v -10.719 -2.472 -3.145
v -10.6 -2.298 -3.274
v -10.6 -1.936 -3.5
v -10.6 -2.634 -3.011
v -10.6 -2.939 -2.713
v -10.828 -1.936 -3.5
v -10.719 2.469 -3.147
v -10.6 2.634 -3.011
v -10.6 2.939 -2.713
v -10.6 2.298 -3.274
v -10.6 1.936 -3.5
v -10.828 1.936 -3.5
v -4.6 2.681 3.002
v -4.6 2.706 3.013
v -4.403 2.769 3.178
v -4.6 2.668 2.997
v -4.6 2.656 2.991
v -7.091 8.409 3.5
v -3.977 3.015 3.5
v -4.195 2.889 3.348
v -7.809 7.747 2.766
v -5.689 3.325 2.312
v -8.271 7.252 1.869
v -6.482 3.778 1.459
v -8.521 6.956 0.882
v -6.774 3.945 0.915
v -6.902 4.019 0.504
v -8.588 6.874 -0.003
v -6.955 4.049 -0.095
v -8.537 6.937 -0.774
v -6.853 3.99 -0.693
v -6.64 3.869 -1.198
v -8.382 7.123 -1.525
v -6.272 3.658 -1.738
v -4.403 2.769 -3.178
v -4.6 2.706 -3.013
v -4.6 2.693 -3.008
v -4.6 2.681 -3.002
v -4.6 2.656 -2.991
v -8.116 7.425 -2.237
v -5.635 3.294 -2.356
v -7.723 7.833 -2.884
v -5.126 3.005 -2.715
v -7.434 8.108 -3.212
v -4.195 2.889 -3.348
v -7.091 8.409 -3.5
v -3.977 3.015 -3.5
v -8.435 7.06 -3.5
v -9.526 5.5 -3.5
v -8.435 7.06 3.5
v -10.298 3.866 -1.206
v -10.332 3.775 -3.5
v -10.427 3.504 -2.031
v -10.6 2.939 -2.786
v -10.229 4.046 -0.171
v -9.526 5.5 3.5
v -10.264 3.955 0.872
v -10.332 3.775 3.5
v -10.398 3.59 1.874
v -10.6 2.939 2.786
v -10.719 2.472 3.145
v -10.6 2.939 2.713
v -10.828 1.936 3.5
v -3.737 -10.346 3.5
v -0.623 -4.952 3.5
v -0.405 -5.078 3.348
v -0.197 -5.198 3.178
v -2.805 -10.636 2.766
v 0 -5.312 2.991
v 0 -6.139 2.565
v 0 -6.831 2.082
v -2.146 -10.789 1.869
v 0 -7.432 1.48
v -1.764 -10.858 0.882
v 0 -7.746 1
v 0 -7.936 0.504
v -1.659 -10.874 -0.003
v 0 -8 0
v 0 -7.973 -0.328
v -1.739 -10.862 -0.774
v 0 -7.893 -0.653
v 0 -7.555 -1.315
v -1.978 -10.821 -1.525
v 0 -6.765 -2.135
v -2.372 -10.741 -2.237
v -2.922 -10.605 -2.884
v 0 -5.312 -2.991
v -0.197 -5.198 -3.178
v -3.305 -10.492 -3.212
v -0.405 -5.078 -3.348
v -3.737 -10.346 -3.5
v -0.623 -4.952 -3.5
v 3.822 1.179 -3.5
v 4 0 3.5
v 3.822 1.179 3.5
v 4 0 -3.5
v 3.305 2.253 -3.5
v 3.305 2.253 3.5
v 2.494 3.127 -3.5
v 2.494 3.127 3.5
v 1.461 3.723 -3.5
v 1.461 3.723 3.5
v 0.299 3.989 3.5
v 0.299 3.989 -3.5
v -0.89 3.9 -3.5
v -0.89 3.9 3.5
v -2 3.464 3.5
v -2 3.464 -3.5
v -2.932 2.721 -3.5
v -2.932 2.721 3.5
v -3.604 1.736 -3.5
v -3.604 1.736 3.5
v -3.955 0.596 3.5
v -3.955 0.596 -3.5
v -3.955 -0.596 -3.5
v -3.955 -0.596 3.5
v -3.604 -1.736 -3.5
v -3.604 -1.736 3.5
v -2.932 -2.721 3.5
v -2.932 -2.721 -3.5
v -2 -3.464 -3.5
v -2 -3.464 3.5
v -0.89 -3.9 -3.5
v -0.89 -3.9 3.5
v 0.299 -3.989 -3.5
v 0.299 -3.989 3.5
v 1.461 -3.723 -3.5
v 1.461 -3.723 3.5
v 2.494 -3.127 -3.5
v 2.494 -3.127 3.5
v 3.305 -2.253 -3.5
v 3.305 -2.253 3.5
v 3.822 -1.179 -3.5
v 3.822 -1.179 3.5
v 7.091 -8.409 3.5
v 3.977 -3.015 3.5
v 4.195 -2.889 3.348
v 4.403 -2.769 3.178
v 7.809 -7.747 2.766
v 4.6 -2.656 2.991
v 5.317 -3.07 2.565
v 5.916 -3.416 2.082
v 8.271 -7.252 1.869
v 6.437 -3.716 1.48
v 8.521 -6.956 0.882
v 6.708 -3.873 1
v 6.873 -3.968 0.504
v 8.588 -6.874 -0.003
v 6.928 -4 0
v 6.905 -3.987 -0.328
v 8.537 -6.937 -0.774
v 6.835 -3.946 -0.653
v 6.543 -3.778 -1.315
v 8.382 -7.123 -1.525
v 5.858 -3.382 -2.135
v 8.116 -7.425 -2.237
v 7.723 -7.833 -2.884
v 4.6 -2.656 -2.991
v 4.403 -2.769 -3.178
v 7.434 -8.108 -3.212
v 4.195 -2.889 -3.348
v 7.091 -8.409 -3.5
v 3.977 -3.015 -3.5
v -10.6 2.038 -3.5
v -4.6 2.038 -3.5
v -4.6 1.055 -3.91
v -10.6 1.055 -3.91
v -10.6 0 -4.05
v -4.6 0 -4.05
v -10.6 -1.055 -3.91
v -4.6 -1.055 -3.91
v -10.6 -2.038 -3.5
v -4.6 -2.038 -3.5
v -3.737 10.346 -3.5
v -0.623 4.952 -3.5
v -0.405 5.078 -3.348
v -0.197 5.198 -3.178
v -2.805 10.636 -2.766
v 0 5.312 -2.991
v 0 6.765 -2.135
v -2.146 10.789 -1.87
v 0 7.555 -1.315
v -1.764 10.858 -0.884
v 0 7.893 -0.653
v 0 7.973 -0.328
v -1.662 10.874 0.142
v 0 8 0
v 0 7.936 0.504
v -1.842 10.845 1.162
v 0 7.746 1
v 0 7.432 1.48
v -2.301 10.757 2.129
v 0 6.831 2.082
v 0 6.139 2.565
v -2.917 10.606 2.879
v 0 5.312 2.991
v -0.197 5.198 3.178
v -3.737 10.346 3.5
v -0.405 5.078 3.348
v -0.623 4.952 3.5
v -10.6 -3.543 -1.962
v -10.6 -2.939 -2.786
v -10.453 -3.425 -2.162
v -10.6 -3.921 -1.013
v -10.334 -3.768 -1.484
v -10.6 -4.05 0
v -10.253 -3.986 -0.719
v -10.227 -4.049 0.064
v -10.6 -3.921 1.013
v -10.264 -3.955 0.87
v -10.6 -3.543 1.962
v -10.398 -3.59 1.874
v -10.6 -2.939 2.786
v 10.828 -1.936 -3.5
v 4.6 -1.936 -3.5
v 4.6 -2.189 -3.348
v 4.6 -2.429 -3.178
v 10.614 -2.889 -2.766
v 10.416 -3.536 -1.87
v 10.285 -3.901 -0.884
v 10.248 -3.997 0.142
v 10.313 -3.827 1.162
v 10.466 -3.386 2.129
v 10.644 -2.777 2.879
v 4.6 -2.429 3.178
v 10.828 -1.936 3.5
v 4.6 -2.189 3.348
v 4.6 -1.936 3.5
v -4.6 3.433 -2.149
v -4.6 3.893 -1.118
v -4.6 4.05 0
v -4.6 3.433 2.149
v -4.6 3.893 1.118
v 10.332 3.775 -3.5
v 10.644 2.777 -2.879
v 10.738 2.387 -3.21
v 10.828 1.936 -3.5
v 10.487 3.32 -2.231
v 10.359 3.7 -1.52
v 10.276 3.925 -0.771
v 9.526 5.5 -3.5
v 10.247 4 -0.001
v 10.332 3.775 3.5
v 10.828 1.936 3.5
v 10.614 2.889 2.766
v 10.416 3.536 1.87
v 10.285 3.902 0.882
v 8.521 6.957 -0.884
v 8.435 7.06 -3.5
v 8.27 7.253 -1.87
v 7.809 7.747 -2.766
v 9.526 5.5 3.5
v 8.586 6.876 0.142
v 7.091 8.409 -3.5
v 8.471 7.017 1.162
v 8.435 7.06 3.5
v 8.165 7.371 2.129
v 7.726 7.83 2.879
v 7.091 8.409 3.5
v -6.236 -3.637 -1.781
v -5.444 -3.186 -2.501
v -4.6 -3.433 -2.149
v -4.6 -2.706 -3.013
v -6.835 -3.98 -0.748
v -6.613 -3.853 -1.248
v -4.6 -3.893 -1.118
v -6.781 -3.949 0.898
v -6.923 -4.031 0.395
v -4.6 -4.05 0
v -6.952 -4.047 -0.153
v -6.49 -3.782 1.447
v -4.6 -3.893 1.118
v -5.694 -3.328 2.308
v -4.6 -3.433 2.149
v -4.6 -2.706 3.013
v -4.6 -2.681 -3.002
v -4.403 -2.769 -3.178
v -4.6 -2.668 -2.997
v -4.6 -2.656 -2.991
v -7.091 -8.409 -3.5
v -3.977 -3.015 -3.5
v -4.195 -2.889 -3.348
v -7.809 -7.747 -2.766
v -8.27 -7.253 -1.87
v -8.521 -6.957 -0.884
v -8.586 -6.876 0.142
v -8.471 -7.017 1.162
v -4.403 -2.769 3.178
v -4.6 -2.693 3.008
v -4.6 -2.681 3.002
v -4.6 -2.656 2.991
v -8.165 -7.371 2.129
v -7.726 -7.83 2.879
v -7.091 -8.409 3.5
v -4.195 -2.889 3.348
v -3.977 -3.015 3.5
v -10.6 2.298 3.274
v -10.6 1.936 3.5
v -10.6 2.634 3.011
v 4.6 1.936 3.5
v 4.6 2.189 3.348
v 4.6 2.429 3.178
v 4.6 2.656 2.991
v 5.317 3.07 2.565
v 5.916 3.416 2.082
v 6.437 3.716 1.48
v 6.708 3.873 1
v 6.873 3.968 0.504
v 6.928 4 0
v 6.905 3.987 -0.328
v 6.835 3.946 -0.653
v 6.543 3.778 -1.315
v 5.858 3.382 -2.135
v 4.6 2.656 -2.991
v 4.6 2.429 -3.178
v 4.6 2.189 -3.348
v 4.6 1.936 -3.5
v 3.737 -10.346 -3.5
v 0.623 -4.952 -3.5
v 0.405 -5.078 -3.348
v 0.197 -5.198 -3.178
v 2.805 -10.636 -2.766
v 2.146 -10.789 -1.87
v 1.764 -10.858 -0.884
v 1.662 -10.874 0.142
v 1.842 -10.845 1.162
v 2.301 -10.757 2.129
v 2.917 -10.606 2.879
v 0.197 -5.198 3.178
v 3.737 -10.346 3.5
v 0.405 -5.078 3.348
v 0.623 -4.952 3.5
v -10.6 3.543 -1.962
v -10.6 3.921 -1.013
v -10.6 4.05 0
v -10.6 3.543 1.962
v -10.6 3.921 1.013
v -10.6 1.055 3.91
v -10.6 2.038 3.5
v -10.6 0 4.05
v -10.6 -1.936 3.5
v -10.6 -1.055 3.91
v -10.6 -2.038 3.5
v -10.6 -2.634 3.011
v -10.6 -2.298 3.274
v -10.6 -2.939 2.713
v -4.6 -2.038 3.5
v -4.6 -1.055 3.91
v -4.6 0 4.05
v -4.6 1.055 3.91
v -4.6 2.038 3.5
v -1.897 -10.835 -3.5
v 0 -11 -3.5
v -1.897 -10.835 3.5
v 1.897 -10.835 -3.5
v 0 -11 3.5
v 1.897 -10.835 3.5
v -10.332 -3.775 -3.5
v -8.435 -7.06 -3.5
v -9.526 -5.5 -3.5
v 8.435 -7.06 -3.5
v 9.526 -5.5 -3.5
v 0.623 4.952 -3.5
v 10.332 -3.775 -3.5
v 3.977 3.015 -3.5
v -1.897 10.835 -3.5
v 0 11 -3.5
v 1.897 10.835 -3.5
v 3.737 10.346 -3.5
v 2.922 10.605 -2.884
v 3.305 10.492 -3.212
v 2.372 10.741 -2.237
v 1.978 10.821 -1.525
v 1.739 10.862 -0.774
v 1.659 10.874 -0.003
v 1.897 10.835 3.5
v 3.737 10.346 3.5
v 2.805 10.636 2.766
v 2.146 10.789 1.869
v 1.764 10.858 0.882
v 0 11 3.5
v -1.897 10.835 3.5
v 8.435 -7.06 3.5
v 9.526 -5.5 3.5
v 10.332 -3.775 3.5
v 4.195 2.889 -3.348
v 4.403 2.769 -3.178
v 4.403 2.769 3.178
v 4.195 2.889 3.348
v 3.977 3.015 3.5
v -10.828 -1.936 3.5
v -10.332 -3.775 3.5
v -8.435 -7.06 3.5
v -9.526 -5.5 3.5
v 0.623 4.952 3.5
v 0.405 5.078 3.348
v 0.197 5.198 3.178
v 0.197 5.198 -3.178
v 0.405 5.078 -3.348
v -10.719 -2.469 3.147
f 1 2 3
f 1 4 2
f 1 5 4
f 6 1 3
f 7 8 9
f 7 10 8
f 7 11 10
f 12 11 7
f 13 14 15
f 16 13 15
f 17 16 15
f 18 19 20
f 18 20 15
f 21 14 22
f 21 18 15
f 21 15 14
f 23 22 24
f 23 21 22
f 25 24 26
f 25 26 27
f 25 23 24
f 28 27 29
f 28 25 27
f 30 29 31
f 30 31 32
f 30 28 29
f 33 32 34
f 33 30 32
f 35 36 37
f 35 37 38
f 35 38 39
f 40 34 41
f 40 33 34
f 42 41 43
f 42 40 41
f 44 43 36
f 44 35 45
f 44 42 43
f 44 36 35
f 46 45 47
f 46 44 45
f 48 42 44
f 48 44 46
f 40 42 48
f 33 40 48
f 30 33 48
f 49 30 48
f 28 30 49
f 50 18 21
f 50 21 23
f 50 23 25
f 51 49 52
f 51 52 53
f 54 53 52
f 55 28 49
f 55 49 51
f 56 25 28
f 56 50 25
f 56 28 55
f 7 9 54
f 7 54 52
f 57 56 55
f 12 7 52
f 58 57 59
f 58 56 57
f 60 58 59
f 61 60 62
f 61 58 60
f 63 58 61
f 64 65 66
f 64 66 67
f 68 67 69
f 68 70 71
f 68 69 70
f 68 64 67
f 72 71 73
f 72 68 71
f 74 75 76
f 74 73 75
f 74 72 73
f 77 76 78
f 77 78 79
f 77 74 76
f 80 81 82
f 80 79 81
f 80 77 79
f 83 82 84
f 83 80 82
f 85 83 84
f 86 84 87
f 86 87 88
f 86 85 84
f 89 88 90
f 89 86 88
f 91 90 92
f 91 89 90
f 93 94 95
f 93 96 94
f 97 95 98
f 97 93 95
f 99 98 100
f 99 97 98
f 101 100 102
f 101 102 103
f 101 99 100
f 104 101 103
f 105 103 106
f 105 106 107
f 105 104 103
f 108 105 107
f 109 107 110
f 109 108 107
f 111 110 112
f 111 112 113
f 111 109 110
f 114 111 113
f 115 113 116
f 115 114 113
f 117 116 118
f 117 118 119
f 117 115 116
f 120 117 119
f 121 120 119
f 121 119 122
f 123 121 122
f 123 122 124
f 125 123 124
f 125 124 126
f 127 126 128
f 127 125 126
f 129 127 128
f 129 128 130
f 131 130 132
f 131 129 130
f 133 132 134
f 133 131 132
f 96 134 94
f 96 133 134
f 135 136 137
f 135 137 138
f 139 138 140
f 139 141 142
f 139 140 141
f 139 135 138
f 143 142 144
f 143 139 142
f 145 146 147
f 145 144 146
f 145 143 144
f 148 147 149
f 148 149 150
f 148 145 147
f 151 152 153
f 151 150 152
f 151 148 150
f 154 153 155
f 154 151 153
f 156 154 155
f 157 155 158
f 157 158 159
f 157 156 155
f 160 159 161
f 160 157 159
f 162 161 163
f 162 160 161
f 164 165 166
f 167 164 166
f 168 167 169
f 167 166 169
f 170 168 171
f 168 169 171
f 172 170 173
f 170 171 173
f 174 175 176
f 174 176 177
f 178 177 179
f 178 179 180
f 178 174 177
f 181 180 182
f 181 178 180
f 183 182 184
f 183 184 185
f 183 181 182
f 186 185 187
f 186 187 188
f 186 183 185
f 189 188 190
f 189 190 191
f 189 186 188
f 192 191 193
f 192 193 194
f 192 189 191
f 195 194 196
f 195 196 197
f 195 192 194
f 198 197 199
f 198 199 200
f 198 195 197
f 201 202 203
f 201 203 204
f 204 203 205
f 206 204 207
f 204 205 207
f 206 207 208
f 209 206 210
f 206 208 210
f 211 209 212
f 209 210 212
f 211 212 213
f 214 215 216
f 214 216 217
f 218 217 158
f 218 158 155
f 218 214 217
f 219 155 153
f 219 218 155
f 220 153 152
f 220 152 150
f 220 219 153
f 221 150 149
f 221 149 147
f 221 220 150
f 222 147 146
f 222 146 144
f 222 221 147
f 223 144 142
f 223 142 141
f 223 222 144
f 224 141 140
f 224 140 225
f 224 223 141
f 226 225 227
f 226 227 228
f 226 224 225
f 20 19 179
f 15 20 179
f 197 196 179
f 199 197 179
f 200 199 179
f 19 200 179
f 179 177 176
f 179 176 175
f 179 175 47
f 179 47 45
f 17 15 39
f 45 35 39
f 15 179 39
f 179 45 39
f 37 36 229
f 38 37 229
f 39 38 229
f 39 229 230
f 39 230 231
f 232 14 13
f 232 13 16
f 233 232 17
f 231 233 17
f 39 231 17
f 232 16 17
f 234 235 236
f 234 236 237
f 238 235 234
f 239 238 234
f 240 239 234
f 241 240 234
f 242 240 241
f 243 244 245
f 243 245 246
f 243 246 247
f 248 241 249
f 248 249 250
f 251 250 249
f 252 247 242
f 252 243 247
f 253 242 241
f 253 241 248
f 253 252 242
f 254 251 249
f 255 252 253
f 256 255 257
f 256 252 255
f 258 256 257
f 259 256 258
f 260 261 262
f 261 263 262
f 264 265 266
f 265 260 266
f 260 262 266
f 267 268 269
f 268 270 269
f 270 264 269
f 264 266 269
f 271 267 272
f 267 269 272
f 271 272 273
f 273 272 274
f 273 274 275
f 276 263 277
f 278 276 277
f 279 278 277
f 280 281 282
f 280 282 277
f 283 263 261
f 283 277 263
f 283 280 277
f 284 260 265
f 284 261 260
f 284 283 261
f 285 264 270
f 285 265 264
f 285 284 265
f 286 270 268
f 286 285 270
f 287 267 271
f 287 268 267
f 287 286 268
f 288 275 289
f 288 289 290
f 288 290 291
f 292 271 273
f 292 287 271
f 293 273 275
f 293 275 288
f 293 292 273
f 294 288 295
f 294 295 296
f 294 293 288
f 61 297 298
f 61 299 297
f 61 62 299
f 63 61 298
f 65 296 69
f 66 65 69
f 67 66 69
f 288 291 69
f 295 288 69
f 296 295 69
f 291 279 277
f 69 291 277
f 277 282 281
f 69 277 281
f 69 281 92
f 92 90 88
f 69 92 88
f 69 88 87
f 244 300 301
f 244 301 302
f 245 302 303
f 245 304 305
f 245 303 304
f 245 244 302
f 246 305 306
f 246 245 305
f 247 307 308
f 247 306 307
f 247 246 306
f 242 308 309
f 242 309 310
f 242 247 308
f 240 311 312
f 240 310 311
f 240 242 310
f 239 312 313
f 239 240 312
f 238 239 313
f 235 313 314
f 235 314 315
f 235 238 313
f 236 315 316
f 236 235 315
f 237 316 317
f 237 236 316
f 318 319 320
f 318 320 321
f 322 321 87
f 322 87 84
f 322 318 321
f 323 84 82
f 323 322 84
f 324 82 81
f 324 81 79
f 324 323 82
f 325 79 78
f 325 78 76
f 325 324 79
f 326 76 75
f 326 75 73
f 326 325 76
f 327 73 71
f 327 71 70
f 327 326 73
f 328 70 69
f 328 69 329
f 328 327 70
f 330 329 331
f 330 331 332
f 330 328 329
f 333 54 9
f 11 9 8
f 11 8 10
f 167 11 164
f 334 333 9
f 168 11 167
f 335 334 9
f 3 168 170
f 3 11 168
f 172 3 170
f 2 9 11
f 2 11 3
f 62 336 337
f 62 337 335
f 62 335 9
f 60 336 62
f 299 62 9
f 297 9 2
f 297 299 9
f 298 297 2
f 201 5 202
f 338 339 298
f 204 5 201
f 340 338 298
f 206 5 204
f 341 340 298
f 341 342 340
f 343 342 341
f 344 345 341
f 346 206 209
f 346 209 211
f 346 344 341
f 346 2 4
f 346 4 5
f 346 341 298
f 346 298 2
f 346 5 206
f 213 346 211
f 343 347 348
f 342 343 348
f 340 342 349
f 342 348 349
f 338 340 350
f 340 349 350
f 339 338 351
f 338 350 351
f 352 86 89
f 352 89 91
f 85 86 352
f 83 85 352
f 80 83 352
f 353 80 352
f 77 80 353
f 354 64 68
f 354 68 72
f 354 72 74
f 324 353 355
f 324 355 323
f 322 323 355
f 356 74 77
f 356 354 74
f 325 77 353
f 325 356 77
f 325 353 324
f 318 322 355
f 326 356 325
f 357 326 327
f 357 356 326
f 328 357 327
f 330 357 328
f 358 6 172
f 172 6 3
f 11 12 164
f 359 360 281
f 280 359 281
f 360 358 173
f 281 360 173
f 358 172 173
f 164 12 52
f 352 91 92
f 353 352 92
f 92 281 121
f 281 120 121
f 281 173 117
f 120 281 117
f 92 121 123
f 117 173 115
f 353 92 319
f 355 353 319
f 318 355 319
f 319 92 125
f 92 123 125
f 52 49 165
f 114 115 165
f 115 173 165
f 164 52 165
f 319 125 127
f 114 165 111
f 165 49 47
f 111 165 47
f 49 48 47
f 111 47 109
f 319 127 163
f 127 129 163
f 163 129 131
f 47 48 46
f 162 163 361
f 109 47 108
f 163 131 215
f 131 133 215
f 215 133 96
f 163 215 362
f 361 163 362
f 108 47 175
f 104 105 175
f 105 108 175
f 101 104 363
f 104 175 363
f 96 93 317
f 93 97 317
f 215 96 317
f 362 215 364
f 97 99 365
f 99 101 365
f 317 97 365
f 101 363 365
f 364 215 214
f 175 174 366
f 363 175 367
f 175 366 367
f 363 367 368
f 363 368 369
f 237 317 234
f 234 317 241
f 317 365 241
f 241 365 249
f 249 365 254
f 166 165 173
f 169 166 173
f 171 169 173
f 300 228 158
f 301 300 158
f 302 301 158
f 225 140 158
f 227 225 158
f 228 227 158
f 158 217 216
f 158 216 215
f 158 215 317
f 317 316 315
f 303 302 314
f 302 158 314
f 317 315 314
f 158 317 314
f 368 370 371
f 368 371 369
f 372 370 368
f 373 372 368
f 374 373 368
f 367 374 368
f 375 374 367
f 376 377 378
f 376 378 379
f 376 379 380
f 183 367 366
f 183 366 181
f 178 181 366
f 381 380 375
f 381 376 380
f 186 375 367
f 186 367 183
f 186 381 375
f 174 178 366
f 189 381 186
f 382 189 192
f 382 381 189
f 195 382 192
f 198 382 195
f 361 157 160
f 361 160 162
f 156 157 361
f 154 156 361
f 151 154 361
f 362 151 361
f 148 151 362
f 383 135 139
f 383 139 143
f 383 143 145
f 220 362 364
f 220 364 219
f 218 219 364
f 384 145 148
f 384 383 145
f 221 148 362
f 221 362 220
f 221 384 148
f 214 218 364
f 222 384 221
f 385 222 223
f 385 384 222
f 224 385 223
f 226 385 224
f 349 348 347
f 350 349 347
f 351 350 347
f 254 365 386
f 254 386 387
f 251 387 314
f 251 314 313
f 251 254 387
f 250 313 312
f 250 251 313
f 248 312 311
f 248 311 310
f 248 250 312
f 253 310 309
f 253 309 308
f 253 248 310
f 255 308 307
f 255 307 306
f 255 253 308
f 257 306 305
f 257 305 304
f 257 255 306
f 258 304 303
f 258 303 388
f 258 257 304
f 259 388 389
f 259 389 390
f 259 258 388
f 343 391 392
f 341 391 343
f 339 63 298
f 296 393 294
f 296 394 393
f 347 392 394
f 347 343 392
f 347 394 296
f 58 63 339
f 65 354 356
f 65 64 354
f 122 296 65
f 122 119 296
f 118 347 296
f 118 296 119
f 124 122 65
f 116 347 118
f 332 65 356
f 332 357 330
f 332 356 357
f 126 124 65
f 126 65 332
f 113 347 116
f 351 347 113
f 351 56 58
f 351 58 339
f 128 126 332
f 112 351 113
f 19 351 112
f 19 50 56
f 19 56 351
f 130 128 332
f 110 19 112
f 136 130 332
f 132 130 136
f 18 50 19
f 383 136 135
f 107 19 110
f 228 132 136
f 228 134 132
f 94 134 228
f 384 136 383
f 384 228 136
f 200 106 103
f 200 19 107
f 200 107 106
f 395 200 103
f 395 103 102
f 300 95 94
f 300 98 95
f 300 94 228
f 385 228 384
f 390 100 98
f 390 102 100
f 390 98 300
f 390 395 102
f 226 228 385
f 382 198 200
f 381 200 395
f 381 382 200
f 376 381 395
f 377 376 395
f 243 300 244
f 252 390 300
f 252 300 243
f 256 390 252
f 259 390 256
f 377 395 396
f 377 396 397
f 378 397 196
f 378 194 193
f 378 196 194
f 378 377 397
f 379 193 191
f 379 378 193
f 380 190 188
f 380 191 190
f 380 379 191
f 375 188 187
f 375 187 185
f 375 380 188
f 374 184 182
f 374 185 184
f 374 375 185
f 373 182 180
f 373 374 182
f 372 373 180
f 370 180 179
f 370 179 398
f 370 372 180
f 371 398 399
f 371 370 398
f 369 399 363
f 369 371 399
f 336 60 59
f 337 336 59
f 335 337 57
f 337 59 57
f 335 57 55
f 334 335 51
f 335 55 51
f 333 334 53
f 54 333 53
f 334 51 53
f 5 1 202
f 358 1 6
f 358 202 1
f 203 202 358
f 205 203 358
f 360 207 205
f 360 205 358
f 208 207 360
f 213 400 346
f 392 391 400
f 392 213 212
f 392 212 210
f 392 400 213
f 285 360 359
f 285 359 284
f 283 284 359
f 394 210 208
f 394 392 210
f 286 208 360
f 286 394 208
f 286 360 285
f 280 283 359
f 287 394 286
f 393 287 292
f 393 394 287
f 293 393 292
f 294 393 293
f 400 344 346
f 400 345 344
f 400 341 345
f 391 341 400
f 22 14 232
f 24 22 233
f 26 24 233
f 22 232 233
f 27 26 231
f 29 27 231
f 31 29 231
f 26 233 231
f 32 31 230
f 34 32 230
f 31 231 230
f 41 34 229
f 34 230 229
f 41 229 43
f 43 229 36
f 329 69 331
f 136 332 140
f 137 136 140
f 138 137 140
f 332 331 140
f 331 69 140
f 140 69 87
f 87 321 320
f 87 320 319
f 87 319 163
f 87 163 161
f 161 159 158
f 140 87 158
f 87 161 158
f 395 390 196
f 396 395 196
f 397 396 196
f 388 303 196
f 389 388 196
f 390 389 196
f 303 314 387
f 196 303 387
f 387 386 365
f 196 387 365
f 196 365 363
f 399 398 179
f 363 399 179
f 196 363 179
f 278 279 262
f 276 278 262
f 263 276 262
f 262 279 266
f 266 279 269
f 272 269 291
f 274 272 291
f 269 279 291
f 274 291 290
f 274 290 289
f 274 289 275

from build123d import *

# Parameters (mm, degrees)
SKETCH1_R           = 11
SKETCH1_R_2         = 4
BOSS_EXTRUDE1_DEPTH = 3.5
SKETCH2_R           = 4
CUT_EXTRUDE3_DEPTH  = 6.4
CIRPATTERN1_COUNT   = 6
SKETCH3_R           = 4.05
BOSS_EXTRUDE2_DEPTH = 6


with BuildPart() as part:
    # Sketch1 → Boss-Extrude1 (new, symmetric)
    with BuildSketch(Plane.XY):
        Circle(SKETCH1_R)
        Circle(SKETCH1_R_2, mode=Mode.SUBTRACT)
    extrude(amount=BOSS_EXTRUDE1_DEPTH, both=True)

    # Sketch2 → Cut-Extrude3 (cut)
    with BuildSketch(Plane(origin=(-11, -17.193061184, 0), x_dir=(0, -1, 0), z_dir=(1, 0, 0))):
        with Locations((-17.193061184, 0)):
            Circle(SKETCH2_R)
    cut_extrude3 = extrude(amount=CUT_EXTRUDE3_DEPTH, mode=Mode.SUBTRACT)

    # CirPattern1: Cut-Extrude3 ×6 about axis
    cirpattern1_axis = Axis((0, 0, 3.5), (0, 0, 1))
    for i in range(1, CIRPATTERN1_COUNT):
        add(cut_extrude3.rotate(cirpattern1_axis, i * 360 / CIRPATTERN1_COUNT), mode=Mode.SUBTRACT)

    # Sketch3 → Boss-Extrude2 (add)
    with BuildSketch(Plane(origin=(-4.6, 0, 0), x_dir=(0, -1, 0), z_dir=(-1, 0, 0))):
        Circle(SKETCH3_R)
    extrude(amount=BOSS_EXTRUDE2_DEPTH)


solid = part.part
